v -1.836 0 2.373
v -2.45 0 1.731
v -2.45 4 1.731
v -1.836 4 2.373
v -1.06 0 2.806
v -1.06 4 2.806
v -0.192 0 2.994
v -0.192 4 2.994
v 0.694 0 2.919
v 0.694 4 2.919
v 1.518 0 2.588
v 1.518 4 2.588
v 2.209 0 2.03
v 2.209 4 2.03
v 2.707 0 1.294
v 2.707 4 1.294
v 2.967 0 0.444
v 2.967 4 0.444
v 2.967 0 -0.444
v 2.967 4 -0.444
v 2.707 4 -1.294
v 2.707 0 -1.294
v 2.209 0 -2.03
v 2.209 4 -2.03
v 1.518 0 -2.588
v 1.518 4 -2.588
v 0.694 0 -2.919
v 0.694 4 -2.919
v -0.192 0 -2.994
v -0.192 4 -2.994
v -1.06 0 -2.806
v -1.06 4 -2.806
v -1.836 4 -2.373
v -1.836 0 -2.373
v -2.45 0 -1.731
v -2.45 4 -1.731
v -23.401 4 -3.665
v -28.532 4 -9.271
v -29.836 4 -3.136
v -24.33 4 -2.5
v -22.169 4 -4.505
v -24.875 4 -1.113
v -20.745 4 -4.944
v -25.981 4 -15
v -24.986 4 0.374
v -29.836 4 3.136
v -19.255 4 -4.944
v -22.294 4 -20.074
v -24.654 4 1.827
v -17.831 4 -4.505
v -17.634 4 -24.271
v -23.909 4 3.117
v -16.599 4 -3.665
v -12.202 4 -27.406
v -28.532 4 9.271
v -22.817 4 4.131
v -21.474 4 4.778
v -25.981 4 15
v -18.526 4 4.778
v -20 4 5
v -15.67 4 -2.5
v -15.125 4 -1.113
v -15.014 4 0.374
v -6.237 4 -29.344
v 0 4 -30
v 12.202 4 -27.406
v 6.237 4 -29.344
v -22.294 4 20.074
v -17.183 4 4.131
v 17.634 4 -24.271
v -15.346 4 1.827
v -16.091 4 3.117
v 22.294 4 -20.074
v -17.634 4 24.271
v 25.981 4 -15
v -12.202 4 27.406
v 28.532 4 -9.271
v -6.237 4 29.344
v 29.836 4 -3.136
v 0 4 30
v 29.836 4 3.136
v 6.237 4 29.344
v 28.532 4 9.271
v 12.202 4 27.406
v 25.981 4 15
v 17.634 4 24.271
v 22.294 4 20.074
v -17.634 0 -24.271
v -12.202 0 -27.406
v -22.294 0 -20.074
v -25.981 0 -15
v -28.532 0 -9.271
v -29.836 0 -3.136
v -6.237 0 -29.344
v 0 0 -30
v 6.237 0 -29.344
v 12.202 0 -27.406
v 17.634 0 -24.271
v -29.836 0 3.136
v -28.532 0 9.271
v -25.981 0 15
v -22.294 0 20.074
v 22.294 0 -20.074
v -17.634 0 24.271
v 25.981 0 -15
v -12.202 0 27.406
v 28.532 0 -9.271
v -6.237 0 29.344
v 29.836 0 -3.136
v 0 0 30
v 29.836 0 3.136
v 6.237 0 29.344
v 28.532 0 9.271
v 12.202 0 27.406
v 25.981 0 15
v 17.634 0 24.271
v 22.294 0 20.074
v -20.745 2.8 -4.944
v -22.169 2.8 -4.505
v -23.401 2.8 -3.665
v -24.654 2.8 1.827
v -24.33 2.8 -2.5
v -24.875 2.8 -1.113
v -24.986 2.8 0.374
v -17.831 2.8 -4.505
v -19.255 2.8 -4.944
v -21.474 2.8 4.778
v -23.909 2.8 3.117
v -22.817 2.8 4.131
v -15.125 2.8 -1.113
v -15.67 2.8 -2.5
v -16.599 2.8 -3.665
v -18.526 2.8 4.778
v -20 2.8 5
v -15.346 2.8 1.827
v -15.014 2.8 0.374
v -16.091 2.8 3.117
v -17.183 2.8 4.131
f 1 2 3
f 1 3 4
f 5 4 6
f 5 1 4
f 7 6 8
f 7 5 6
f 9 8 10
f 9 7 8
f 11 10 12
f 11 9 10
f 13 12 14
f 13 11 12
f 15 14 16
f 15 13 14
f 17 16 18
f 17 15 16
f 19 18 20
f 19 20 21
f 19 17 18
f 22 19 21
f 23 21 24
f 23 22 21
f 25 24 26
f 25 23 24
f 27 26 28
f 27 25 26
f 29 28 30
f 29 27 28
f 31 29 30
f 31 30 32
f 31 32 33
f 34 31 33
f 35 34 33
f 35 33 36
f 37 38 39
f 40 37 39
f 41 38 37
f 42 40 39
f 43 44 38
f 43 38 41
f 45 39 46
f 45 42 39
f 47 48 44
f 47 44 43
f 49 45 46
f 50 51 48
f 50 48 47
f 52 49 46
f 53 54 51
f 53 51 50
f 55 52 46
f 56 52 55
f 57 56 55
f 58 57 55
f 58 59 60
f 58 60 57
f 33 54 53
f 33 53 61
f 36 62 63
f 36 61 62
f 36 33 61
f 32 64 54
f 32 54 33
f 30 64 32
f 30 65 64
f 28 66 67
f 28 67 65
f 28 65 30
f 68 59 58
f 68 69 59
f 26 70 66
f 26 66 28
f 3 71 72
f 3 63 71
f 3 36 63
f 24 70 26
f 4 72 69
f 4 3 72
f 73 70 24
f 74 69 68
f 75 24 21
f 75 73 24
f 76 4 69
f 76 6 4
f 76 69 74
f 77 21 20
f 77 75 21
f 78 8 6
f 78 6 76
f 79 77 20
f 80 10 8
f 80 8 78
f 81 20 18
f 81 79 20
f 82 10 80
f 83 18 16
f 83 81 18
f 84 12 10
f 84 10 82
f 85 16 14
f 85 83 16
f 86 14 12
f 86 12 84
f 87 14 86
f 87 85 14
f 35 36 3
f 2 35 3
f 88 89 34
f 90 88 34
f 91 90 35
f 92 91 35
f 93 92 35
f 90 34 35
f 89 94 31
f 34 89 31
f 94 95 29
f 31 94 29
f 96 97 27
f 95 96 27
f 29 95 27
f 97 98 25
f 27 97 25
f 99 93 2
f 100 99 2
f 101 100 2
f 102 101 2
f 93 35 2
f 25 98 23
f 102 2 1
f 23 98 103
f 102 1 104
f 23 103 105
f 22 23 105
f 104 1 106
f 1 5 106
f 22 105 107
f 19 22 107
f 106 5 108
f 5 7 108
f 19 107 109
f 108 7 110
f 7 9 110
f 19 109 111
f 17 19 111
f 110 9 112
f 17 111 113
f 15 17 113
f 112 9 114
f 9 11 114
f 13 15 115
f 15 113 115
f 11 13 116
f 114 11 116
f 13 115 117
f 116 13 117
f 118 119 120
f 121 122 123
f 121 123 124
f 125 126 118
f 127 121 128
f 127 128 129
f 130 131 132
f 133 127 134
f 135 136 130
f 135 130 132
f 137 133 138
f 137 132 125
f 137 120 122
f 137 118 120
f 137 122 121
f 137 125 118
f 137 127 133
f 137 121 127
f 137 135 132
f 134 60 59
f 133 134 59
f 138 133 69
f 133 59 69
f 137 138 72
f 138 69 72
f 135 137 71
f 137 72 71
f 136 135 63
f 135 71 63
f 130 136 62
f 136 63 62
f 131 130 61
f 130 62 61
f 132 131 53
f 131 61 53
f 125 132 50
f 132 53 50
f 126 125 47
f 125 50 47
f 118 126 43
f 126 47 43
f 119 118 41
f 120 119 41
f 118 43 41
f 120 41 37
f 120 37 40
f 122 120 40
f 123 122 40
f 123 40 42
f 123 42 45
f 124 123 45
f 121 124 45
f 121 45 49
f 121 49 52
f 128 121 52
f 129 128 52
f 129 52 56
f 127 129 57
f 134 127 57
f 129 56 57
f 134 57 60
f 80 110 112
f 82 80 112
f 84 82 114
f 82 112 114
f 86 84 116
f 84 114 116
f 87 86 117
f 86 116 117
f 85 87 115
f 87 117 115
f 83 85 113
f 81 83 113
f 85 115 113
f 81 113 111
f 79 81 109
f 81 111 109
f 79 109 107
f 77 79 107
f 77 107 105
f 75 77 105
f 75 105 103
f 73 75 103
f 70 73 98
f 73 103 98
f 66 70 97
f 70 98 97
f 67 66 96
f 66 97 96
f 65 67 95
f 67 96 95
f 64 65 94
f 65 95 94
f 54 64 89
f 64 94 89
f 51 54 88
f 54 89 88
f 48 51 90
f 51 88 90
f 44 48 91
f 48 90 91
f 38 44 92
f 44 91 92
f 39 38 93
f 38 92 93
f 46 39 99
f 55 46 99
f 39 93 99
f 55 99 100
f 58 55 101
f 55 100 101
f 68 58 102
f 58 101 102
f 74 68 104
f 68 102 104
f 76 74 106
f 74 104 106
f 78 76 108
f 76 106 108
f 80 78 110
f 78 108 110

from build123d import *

# Parameters (mm, degrees)
SKETCH1_R           = 30
BOSS_EXTRUDE1_DEPTH = 4
SKETCH2_R           = 5
CUT_EXTRUDE1_DEPTH  = 1.2


with BuildPart() as part:
    # Sketch1 → Boss-Extrude1 (new body)
    with BuildSketch(Plane(origin=(0, 0, 0), x_dir=(1, 0, 0), z_dir=(0, 1, 0))):
        with Locations(Location((0, 0, 0), (0, 0, 270))):
            Circle(SKETCH1_R)
        with BuildLine():
            Line((-2.45, 1.731328969), (-2.45, 0))
            Line((-2.45, 0), (-2.45, -1.731328969))
            ThreePointArc((-2.45, -1.731328969), (3, 0), (-2.45, 1.731328969))
        make_face(mode=Mode.SUBTRACT)
    extrude(amount=BOSS_EXTRUDE1_DEPTH)

    # Sketch2 → Cut-Extrude1 (cut)
    with BuildSketch(Plane(origin=(0, 4, 0), x_dir=(1, 0, 0), z_dir=(0, 1, 0))):
        with Locations(Location((-20, 0, 0), (0, 0, 270))):
            Circle(SKETCH2_R)
    extrude(amount=-CUT_EXTRUDE1_DEPTH, mode=Mode.SUBTRACT)


solid = part.part
